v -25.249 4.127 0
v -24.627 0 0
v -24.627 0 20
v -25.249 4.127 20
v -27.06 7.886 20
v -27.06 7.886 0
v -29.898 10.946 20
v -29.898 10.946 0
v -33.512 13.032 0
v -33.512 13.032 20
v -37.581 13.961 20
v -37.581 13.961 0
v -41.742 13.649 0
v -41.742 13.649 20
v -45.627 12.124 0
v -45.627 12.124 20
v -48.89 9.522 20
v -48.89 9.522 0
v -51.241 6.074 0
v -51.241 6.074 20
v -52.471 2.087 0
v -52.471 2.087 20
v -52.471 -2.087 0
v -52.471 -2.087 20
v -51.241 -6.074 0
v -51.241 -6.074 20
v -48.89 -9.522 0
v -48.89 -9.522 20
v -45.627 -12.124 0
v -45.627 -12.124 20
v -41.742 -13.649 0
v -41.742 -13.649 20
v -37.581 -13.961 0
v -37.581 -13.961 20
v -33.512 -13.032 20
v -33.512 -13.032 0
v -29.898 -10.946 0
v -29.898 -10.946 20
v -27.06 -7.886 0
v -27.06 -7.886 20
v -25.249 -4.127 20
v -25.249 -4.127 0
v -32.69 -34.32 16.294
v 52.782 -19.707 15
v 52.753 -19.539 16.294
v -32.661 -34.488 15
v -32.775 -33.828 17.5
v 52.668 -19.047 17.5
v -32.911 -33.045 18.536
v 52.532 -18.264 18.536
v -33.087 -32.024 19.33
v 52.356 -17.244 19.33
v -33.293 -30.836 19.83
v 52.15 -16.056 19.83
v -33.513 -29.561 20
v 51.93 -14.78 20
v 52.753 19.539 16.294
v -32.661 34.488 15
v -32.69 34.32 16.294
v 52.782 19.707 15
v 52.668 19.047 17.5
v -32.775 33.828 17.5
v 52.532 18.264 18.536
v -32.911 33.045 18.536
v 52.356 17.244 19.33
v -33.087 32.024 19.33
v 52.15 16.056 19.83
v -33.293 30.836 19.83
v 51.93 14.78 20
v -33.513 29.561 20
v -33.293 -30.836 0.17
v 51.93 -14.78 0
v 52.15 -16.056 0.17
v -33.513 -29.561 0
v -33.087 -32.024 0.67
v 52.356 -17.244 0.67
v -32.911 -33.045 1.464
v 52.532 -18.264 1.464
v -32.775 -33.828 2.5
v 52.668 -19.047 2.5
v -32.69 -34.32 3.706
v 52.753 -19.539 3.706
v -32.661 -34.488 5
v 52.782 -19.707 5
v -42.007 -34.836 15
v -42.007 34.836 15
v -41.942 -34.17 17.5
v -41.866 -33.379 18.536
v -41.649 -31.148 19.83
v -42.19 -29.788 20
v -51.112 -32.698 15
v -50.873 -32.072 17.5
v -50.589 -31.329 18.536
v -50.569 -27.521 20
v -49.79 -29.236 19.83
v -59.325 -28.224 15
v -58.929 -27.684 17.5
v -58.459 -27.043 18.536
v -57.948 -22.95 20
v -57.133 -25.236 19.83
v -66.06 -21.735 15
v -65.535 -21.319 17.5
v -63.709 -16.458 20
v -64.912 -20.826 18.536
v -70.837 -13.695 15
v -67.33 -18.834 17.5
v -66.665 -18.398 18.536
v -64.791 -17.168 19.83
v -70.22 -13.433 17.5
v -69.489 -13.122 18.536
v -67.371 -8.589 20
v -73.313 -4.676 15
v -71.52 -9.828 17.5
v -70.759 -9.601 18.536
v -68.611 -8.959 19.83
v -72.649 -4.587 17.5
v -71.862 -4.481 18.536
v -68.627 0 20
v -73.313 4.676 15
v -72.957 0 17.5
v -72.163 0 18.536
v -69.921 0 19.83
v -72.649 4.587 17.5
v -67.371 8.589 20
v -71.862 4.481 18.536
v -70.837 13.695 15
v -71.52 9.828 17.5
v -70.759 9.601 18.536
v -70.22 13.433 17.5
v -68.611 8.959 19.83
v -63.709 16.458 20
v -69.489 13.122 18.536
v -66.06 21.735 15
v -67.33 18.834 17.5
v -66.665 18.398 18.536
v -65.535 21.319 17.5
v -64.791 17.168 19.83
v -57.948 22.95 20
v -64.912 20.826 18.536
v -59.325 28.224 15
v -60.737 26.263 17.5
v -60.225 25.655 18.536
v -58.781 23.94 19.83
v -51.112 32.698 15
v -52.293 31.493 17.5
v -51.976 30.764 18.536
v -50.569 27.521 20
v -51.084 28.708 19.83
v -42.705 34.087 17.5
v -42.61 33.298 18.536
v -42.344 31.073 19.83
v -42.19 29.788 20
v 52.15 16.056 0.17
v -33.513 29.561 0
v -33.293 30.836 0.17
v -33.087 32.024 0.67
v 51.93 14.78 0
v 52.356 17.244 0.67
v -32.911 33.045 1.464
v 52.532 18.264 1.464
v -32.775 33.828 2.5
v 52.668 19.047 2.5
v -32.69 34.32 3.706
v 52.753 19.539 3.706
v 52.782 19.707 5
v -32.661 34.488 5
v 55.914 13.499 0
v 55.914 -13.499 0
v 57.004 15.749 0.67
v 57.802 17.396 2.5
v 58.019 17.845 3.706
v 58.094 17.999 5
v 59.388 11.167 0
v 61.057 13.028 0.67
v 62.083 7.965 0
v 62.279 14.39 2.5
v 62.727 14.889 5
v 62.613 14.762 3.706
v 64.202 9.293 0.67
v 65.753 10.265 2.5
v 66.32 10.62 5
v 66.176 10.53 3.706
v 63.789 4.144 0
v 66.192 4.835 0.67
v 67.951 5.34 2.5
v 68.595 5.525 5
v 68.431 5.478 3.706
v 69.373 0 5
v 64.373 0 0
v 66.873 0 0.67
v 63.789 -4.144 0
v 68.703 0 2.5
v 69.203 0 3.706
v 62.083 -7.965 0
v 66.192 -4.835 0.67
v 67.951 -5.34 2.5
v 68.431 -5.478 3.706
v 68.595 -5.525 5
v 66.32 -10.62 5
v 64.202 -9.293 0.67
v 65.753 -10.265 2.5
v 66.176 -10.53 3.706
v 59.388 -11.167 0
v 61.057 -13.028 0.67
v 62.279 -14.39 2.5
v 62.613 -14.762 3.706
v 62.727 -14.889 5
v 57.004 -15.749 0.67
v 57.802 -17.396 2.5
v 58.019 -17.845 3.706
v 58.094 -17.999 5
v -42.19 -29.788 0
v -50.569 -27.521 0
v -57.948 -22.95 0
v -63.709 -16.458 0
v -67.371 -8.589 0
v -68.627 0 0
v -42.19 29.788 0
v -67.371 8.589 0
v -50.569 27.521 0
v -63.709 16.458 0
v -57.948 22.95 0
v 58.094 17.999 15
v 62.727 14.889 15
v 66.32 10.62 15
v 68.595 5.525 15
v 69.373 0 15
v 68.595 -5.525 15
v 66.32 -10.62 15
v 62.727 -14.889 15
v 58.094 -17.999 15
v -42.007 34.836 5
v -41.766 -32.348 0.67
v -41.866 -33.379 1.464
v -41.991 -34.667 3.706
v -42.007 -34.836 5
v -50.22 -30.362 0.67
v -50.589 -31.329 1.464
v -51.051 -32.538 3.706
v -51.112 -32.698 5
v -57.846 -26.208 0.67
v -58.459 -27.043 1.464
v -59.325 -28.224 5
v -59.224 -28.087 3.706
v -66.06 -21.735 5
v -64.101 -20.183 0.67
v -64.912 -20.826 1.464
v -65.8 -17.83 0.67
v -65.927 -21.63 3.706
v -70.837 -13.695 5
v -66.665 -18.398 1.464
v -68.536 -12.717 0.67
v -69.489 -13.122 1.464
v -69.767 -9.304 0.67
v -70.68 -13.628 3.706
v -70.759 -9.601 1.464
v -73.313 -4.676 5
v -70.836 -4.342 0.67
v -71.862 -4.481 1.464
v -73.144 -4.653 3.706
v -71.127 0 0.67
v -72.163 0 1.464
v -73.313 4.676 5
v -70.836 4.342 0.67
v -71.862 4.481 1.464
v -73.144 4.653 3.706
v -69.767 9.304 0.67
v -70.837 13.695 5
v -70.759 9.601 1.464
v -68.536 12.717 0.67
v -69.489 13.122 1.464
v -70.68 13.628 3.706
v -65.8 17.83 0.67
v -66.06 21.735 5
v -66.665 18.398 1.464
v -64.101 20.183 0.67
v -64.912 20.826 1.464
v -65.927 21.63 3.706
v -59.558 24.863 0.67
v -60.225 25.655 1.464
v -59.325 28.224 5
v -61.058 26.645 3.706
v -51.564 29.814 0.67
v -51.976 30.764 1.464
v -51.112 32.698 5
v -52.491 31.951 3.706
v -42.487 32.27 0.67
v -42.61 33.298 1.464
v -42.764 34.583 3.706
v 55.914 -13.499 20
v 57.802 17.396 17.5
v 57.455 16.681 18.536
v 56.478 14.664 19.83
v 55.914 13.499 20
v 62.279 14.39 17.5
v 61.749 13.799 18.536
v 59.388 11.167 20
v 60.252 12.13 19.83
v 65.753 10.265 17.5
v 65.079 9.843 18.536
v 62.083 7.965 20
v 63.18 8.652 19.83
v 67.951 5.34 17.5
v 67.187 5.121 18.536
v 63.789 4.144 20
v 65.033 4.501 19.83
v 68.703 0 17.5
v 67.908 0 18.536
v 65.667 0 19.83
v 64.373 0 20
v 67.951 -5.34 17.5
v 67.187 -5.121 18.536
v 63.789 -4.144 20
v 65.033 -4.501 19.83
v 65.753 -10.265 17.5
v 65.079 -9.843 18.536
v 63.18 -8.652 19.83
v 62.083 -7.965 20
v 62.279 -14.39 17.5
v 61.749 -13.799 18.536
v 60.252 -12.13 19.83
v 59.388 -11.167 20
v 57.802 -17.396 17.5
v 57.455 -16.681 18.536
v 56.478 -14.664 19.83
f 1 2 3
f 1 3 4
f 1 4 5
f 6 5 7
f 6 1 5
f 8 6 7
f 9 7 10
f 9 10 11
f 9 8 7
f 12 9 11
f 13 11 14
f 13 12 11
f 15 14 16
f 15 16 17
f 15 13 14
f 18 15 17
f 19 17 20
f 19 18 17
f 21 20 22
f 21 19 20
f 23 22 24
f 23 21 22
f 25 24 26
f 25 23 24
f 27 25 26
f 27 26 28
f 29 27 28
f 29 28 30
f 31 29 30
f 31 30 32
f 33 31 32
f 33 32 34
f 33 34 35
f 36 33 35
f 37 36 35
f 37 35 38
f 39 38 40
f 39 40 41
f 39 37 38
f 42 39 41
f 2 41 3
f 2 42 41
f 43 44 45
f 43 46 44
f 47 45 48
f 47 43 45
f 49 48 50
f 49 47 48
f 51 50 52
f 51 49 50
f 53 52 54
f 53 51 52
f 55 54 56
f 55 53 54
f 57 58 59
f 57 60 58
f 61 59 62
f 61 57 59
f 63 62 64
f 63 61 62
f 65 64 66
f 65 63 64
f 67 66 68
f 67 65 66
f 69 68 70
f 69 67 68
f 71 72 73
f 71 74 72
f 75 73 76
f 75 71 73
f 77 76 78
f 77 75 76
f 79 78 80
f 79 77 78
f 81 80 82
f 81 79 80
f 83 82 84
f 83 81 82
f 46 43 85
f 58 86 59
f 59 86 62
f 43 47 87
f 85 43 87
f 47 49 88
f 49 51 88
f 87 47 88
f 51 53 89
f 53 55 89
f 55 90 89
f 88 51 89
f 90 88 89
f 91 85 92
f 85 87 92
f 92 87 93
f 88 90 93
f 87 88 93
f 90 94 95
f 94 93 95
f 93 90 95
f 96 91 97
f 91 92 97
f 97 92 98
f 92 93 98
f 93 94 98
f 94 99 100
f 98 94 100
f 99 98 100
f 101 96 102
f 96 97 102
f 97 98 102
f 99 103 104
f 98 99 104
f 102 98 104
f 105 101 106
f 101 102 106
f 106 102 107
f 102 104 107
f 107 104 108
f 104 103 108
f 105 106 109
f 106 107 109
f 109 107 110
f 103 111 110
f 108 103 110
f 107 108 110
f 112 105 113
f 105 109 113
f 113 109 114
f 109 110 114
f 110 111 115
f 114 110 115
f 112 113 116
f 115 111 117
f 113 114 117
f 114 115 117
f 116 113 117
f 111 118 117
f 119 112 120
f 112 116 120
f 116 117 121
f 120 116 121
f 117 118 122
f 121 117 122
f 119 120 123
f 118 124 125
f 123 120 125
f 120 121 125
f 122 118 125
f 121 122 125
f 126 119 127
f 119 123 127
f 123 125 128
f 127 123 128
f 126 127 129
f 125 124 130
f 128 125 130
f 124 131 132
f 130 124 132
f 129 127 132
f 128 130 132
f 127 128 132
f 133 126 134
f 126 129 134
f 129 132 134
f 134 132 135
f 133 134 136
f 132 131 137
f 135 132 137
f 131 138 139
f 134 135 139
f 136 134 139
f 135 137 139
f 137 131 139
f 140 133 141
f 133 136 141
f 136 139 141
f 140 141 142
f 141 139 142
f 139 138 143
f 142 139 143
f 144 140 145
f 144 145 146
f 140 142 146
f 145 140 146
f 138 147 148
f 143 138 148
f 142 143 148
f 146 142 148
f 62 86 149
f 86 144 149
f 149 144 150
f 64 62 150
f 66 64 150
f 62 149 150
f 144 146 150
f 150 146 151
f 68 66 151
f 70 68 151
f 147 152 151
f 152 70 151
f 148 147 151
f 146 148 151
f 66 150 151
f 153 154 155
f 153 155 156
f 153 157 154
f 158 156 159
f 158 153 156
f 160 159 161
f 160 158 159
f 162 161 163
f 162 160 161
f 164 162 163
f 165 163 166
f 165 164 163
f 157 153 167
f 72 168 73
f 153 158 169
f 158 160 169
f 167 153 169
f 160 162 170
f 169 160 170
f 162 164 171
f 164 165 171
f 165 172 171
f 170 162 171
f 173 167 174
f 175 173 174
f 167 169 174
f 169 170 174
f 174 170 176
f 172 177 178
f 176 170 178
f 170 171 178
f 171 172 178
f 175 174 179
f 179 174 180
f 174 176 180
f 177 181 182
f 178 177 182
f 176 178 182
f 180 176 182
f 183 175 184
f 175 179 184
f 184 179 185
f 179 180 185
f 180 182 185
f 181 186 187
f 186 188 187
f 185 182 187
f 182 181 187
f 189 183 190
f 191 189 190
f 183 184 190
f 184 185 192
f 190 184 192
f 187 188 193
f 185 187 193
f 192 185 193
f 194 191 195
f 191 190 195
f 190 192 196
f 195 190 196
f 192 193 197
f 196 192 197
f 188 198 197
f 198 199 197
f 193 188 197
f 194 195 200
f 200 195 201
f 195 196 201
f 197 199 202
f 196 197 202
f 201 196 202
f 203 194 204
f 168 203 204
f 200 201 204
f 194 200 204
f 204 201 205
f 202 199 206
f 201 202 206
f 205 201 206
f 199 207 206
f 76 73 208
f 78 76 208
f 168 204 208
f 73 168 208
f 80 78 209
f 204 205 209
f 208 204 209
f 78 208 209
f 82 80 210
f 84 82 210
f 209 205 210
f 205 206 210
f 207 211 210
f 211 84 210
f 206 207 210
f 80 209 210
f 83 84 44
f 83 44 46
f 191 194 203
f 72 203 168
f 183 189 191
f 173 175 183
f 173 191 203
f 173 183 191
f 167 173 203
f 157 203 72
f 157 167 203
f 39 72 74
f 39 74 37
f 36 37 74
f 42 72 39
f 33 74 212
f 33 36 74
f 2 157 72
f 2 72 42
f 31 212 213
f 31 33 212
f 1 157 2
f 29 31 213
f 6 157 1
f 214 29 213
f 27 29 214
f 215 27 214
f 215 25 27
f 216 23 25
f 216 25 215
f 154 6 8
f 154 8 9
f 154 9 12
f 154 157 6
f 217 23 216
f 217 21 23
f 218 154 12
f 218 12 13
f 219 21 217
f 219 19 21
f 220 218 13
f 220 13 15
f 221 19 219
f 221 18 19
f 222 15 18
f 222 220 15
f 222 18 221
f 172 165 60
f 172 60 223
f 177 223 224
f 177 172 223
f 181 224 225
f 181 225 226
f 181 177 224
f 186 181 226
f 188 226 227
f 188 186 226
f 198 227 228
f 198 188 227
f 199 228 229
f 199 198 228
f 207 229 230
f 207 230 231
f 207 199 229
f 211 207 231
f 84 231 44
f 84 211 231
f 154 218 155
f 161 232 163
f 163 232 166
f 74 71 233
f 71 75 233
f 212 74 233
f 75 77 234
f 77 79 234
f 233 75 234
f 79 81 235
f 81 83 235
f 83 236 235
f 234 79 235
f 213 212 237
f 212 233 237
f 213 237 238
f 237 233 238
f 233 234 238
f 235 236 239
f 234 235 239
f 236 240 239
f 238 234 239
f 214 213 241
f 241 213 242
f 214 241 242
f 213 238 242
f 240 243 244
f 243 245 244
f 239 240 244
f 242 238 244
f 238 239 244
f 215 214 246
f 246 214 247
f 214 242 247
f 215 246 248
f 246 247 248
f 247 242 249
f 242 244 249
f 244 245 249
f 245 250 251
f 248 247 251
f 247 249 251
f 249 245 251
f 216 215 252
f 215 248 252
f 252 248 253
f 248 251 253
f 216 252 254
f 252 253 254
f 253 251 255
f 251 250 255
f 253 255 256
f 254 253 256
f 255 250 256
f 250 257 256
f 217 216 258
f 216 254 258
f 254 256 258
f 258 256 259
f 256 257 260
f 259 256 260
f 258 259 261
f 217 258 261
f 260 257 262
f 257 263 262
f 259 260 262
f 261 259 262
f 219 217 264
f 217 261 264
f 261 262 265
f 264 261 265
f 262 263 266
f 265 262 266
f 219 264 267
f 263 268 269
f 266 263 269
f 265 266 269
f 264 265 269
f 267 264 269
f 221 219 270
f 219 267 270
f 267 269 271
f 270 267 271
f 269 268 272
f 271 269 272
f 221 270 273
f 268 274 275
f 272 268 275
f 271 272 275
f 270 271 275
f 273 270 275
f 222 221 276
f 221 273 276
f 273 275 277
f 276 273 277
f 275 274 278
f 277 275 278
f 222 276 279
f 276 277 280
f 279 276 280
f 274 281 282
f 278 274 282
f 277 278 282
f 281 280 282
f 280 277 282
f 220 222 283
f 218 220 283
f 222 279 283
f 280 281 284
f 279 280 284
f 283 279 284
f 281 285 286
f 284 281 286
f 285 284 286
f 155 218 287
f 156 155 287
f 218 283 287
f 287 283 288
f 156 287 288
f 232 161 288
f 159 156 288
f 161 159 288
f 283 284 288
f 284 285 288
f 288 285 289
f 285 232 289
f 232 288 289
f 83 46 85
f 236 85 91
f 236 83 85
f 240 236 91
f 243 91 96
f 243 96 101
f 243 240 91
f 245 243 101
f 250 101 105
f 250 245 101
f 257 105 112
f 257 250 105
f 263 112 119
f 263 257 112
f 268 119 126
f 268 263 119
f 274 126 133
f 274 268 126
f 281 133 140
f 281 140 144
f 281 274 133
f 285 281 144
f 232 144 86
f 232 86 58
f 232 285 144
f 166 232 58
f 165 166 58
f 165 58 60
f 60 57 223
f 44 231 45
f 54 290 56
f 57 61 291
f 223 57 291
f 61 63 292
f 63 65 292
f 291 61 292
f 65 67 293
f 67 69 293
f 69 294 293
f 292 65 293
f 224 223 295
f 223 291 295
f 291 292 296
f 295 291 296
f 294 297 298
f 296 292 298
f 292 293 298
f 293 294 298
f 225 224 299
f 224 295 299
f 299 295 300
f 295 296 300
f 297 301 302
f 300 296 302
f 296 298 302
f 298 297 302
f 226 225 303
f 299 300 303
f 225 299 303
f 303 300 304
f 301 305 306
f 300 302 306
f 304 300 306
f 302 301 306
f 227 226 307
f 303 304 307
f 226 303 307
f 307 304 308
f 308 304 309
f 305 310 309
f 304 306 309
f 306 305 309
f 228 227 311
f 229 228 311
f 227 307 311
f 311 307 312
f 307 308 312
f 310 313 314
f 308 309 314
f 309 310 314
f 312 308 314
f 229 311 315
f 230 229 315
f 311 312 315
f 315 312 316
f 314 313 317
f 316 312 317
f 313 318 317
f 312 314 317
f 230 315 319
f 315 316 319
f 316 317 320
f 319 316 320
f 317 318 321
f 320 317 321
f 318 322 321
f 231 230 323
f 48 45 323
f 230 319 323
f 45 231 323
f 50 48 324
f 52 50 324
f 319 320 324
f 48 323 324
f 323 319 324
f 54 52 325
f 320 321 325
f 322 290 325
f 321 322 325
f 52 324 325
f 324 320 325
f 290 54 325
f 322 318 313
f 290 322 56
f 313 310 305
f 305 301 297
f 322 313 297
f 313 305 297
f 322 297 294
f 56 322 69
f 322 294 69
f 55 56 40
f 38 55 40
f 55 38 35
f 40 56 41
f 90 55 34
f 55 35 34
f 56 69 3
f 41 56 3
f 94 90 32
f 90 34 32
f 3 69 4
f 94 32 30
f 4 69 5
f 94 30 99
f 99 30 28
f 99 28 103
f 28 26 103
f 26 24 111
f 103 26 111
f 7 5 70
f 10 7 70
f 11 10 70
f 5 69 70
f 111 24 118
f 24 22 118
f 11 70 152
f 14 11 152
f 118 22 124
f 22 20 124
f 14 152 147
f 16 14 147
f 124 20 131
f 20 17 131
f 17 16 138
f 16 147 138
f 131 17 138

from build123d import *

# Parameters (mm, degrees)
SKETCH_1_R      = 14
EXTRUDE_1_DEPTH = 20
FILLET_1_R      = 5
FILLET_2_R      = 5


with BuildPart() as part:
    # 草图1 → 凸台-拉伸1 (new body)
    with BuildSketch(Plane.XY):
        with BuildLine():
            Line((-32.661153615, 34.487793909), (52.782028203, 19.707310805))
            ThreePointArc((52.782028203, 19.707310805), (69.372937294, 0), (52.782028203, -19.707310805))
            Line((52.782028203, -19.707310805), (-32.661153615, -34.487793909))
            ThreePointArc((-32.661153615, -34.487793909), (-73.627062706, 0), (-32.661153615, 34.487793909))
        make_face()
        with Locations((-38.627062706, 0)):
            Circle(SKETCH_1_R, mode=Mode.SUBTRACT)
    extrude(amount=EXTRUDE_1_DEPTH)

    # 圆角1
    fillet_1_edges = [part.edges().sort_by_distance(p)[0] for p in [
        (-73.627062706, 0, 20),
        (10.060437294, -27.097552357, 20),
        (69.372937294, 0, 20),
        (10.060437294, 27.097552357, 20),
    ]]
    fillet(fillet_1_edges, radius=FILLET_1_R)

    # 圆角2
    fillet_2_edges = [part.edges().sort_by_distance(p)[0] for p in [
        (10.060437294, -27.097552357, 0),
        (-73.627062706, 0, 0),
        (10.060437294, 27.097552357, 0),
        (69.372937294, 0, 0),
    ]]
    fillet(fillet_2_edges, radius=FILLET_2_R)


solid = part.part
